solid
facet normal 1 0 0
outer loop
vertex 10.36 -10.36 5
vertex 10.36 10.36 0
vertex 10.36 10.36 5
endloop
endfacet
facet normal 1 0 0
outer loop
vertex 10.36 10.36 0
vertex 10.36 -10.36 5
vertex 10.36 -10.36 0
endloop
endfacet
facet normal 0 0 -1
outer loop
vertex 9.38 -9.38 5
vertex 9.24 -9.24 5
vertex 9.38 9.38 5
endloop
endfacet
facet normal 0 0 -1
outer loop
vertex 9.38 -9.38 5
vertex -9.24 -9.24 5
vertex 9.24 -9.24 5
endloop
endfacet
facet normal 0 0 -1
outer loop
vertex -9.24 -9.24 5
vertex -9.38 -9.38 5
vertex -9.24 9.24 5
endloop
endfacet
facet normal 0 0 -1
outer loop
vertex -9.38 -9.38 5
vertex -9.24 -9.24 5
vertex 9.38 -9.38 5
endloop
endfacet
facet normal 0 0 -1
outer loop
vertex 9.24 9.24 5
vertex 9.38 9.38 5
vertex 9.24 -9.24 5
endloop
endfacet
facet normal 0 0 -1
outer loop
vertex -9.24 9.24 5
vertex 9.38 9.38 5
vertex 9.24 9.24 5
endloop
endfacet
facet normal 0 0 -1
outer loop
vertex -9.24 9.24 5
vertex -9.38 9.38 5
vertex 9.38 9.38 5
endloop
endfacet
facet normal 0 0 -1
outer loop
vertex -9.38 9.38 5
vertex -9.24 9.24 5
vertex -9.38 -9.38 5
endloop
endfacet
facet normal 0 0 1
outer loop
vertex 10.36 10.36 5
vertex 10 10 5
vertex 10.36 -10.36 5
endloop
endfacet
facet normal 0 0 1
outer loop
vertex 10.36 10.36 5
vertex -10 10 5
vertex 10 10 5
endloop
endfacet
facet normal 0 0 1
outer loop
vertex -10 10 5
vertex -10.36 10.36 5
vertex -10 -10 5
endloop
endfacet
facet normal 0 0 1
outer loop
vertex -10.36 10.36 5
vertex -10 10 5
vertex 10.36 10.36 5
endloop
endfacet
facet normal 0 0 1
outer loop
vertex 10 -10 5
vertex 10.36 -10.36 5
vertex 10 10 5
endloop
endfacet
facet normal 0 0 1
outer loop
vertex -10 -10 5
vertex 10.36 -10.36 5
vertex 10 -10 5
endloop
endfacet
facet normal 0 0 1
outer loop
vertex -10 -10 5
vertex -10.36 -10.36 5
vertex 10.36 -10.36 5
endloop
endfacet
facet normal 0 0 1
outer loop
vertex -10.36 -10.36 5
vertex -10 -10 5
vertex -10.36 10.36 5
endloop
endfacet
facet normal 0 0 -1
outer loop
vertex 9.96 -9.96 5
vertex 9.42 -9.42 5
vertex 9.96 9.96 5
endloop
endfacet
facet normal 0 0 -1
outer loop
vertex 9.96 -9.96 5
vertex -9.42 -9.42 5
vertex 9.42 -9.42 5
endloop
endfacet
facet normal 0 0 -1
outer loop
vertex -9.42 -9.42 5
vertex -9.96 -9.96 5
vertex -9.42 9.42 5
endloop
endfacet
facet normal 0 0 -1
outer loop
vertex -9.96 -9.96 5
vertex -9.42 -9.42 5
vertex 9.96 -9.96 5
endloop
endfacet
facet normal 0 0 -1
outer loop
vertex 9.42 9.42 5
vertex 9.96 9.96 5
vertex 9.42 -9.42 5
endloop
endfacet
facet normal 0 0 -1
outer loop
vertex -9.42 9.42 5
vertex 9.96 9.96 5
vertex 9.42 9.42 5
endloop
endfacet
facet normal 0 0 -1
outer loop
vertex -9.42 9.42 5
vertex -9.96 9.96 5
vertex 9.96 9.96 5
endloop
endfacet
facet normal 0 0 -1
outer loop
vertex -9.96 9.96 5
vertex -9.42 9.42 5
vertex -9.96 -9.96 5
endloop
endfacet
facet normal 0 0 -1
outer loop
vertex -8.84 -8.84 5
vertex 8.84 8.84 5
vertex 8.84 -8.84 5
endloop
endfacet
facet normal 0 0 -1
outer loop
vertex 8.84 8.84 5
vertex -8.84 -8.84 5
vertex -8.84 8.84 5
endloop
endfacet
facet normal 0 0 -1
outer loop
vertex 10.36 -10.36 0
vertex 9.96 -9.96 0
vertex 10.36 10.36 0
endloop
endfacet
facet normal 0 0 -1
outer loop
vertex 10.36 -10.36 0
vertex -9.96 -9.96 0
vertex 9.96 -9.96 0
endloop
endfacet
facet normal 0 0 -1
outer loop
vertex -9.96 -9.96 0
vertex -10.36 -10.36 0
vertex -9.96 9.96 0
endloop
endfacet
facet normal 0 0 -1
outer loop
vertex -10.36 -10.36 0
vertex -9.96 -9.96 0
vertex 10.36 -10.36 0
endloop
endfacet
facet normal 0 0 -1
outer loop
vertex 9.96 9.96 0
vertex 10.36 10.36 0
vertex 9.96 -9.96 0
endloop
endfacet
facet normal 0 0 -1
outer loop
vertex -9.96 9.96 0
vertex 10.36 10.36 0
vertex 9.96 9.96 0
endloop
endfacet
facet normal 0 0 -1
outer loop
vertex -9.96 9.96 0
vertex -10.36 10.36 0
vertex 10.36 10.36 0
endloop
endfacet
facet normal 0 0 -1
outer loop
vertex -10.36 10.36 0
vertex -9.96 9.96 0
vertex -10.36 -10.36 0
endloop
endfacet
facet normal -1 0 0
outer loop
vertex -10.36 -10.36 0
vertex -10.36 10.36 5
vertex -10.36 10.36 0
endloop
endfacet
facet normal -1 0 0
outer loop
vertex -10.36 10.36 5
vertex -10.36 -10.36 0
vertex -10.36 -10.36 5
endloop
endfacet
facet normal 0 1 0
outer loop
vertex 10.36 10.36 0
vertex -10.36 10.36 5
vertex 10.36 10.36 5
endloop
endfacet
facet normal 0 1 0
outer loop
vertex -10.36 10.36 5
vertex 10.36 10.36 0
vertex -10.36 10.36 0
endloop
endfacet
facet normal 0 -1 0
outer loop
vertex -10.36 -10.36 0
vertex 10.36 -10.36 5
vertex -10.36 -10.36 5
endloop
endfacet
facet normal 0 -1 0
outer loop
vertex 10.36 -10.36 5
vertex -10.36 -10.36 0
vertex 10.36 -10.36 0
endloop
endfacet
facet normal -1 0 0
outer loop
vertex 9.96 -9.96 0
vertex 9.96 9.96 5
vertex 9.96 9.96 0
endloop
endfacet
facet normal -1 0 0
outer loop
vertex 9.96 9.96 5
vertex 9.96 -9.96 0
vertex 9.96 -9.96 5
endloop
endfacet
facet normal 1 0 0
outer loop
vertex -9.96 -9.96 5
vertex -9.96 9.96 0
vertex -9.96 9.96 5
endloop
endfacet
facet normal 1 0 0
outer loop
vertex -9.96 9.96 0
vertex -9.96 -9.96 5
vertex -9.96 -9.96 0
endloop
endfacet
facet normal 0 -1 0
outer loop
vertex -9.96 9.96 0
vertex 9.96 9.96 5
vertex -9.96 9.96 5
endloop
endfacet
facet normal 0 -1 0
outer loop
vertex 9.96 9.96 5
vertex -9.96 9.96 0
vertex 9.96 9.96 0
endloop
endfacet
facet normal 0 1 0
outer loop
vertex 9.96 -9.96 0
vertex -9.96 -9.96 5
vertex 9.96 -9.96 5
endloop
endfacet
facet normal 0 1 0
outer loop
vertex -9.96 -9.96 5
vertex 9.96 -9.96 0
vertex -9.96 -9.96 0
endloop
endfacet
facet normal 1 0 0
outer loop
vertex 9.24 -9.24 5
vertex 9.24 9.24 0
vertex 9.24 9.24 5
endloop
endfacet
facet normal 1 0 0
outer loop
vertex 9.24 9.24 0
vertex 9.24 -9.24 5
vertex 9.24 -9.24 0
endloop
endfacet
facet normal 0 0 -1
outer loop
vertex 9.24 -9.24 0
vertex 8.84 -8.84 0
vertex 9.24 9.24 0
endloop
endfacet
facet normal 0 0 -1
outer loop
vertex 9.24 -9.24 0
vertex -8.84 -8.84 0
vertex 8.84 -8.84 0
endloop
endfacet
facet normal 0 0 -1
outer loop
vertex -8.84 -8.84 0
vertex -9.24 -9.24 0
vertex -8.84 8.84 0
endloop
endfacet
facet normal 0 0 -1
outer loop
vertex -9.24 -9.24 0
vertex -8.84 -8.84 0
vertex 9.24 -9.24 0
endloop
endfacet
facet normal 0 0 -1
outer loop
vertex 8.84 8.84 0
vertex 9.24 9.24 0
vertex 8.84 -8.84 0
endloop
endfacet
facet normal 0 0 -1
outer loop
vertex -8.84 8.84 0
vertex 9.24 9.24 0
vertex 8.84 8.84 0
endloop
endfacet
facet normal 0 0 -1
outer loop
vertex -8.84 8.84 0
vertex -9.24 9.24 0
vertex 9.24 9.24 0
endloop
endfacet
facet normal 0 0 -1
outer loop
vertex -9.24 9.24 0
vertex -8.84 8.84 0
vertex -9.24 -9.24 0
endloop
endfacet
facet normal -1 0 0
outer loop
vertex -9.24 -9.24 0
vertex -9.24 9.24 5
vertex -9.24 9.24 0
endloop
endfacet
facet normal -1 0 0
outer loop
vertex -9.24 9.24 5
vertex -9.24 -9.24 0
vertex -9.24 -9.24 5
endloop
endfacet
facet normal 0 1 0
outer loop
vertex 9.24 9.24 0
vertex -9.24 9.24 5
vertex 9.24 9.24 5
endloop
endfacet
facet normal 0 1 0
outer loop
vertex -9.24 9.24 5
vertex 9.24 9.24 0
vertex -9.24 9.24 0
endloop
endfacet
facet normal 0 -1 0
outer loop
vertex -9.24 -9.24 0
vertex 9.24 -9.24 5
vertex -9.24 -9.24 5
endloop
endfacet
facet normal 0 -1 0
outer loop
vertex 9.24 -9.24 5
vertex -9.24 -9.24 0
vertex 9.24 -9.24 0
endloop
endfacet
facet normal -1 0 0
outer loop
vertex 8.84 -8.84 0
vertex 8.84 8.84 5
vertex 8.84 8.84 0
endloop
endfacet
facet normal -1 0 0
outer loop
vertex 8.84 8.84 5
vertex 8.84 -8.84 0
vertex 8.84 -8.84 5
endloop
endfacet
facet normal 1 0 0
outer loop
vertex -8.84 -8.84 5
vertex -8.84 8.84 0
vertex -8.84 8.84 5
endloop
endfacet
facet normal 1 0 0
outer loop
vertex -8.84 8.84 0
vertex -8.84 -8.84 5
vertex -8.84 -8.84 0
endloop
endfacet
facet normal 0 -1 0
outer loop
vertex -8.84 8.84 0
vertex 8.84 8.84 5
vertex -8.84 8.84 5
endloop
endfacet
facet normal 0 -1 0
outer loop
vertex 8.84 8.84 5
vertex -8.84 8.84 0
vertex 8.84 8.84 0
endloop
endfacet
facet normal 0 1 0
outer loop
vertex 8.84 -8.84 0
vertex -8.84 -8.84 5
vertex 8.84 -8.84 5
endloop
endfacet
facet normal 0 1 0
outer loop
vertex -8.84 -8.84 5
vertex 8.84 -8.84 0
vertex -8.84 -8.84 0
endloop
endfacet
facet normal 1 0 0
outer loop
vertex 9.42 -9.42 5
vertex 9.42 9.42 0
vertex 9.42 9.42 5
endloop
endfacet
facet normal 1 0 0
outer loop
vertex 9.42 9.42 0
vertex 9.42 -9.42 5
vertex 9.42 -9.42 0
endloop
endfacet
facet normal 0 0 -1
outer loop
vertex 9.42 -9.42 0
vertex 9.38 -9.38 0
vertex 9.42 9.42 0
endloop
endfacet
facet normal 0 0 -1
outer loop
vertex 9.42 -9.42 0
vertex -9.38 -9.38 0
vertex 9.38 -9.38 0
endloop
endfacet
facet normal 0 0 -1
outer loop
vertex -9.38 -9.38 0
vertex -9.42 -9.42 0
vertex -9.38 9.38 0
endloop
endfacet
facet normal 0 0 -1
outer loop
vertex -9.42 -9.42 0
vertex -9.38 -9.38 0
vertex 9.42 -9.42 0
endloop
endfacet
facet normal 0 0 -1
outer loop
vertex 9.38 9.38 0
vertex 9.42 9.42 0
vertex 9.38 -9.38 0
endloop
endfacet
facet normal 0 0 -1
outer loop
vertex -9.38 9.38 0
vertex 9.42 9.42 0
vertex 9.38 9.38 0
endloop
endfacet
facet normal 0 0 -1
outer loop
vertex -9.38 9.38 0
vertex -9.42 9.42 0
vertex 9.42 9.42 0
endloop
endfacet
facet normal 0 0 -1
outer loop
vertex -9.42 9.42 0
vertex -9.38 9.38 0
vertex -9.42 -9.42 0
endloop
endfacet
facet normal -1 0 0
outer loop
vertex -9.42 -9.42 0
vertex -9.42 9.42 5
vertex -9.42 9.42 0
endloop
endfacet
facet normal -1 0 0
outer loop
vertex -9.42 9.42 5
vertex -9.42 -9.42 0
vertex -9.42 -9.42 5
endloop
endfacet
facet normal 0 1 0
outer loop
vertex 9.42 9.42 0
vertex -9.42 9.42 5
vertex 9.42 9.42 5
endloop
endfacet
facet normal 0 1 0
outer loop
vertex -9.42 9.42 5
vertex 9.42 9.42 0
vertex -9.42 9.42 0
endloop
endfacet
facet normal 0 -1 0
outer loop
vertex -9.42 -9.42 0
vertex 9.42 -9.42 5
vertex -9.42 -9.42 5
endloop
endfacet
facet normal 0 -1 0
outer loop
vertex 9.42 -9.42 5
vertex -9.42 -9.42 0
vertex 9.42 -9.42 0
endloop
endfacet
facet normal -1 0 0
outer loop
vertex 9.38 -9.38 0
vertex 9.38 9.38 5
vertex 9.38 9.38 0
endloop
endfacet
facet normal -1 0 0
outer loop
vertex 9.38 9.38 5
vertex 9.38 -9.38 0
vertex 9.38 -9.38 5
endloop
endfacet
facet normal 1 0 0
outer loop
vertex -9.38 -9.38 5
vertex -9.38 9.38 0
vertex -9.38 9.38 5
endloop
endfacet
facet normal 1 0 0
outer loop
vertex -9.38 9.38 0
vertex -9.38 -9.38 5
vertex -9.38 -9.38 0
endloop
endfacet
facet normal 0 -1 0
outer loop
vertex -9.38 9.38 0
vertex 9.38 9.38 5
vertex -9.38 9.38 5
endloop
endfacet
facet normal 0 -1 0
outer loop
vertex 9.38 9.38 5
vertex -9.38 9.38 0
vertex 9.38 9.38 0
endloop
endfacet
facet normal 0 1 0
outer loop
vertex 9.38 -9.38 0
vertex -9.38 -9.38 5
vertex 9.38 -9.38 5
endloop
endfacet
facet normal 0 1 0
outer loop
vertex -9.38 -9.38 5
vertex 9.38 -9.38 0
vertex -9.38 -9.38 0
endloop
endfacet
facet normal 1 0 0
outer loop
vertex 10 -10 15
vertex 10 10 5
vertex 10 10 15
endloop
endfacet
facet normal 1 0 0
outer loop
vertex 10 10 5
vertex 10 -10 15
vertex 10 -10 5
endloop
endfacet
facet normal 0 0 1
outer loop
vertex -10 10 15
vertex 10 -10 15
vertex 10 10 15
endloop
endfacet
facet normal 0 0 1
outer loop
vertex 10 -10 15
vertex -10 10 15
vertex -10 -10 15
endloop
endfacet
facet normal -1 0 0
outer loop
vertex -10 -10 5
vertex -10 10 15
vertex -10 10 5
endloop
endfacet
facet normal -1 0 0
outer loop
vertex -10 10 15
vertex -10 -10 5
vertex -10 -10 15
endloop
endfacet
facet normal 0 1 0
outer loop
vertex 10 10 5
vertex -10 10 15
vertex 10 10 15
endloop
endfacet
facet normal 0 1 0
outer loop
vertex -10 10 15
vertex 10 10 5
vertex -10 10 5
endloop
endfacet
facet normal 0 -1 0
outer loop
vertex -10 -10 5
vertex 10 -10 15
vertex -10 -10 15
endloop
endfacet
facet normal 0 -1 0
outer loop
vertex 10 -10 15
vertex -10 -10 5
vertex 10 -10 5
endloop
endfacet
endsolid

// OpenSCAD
filament_w = 0.4;
overhang = 0.90;
support_h = 5;
outset = filament_w * overhang;
overlap = filament_w - outset;

translate([0, 0, 10])
cube(size=[20, 20, 10], center=true);

module shell(side) {
 translate([0, 0, support_h / 2])
 difference() {
  cube(size=[side, side, support_h], center=true);
  cube(size=[side - filament_w * 2, side - filament_w * 2, support_h + 1], center=true);
 }
}

shell(20 + filament_w * overhang * 2);
shell(20 - filament_w * 2 - filament_w * overhang * 2);


translate([0, 0, support_h / 2])
difference() {
cube(size=[20 + outset, 20 + outset, support_h], center=true);
cube(size=[20 - overlap, 20 - overlap, support_h], center=true);
}
translate([0, 0, support_h / 2])
difference() {
cube(size=[20 - filament_w * 2 - outset, 
	       20 - filament_w * 2 - outset, support_h], 
     center=true);
cube(size=[20 - filament_w - filament_w * 2 - overlap, 
           20 - filament_w - filament_w * 2- overlap, support_h], 
     center=true);
}
